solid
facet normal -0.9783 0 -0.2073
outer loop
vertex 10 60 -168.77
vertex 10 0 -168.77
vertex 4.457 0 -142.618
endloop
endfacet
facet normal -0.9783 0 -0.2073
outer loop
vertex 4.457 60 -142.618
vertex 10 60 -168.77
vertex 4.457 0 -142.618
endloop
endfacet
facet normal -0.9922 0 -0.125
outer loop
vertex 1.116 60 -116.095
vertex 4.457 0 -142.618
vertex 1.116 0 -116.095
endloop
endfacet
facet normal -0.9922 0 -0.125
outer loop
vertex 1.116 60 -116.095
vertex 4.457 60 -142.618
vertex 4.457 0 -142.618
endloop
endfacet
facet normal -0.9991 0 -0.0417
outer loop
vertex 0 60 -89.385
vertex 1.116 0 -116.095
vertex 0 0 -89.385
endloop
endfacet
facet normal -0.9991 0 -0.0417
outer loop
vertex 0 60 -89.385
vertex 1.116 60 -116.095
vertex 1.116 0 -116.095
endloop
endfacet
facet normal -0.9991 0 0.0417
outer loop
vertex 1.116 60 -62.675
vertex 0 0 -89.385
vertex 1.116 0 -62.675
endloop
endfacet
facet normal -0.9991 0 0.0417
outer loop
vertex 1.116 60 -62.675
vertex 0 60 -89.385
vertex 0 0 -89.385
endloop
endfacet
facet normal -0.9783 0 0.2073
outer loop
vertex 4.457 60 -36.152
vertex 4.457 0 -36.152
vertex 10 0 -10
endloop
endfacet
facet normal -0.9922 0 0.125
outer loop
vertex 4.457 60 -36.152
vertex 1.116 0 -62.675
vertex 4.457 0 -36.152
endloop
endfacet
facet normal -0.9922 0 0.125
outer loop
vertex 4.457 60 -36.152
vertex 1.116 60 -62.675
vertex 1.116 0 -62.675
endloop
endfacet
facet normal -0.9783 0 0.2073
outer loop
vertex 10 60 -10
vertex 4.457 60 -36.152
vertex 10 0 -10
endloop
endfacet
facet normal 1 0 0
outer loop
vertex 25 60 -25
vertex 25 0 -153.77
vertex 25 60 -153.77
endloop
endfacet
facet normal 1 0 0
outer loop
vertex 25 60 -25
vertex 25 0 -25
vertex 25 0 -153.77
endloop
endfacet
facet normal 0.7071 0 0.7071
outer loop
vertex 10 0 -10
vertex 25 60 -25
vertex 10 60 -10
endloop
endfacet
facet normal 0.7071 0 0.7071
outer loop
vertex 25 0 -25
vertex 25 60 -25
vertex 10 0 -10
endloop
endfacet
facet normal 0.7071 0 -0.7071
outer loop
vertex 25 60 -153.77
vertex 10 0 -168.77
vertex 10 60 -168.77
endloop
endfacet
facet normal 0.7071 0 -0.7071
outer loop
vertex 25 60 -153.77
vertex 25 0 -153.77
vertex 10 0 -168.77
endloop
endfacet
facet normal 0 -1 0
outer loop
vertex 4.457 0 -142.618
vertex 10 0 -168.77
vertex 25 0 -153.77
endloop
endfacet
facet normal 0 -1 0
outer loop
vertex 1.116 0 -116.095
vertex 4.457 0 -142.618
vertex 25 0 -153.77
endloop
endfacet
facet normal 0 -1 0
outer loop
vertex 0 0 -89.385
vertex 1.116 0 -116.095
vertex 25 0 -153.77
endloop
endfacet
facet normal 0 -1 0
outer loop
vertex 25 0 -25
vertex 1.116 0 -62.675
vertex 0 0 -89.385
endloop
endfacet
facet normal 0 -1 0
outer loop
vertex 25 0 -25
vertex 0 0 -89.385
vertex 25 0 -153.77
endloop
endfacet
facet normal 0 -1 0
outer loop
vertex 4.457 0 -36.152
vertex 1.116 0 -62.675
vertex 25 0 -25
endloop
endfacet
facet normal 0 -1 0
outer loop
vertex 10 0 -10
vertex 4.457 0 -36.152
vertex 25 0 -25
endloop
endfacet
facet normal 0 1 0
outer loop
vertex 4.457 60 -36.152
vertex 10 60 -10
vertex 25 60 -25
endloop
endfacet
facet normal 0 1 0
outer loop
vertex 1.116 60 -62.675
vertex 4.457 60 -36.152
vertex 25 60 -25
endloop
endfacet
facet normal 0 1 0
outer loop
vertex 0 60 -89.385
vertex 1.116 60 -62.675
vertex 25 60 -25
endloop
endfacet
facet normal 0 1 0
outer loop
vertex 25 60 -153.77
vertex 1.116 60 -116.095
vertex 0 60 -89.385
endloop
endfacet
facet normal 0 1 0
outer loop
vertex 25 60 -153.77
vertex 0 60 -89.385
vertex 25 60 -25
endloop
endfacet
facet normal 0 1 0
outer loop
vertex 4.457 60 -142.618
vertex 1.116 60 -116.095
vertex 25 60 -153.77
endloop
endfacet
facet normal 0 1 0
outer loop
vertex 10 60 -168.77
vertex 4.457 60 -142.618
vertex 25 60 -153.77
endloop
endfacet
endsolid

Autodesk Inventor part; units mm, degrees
ref_plane "YZ Plane" through (0, 0, 0) normal (1, 0, 0) x (0, 1, 0)
ref_plane "XZ Plane" through (0, 0, 0) normal (0, 1, 0) x (-1, 0, 0)
ref_plane "XY Plane" through (0, 0, 0) normal (0, 0, 1) x (1, 0, 0)
sketch "Эскиз1" plane through (0, 0, 0) normal (1, 0, 0) x (0, 1, 0)
  line L0 (0, 0) -> (60, 0)
  line L1 (60, 0) -> (60, -178.77)
  line L2 (60, -178.77) -> (0, -178.77)
  line L3 (0, -178.77) -> (0, 0)
  dimension "d0" = 60
  dimension "d1" = 178.77
extrude "Выдавливание1" add sketch "Эскиз1" along normal blind 25
chamfer "Фаска1" distance 25 angle 45 2 edges at (25, 30, 0) (25, 30, -178.77)
sketch "Эскиз2" plane through (0, 60, 0) normal (0, 1, 0) x (1, 0, 0)
  line L0 (25, 153.77) -> (3.5, 175.27) projected
  arc A0 (10, 168.77) -> (10, 10) centre (320.0989, 89.385) ccw
  line L1 (0, 0) -> (0, 178.77) projected
  line L2 (0, 89.385) -> (124.8295, 89.385)
  line L3 (25, 25) -> (0, 0) projected
  arc A1 (25, 153.77) -> (25, 25) centre (320.0989, 89.385) ccw
  line L4 (0, 178.77) -> (25, 153.77) projected
  line L5 (0, 0) -> (0, 178.77) projected
  line L6 (25, 25) -> (0, 0) projected
  line L7 (25, 153.77) -> (25, 25) projected
  line L8 (10, 10) -> (0, 0)
  line L9 (0, 0) -> (0, 89.385)
  line L10 (0, 89.385) -> (0, 178.77)
  line L11 (10, 168.77) -> (0, 178.77)
  line L12 (25, 153.77) -> (25, 25)
  point P0 (7, 178.77)
  dimension "d7" = 10
extrude "Выдавливание2" cut sketch "Эскиз2" against normal blind 60 contours A0 L1 L4 L0 | A0 L3 L1
properties part number "Short" material "Красное дерево"
